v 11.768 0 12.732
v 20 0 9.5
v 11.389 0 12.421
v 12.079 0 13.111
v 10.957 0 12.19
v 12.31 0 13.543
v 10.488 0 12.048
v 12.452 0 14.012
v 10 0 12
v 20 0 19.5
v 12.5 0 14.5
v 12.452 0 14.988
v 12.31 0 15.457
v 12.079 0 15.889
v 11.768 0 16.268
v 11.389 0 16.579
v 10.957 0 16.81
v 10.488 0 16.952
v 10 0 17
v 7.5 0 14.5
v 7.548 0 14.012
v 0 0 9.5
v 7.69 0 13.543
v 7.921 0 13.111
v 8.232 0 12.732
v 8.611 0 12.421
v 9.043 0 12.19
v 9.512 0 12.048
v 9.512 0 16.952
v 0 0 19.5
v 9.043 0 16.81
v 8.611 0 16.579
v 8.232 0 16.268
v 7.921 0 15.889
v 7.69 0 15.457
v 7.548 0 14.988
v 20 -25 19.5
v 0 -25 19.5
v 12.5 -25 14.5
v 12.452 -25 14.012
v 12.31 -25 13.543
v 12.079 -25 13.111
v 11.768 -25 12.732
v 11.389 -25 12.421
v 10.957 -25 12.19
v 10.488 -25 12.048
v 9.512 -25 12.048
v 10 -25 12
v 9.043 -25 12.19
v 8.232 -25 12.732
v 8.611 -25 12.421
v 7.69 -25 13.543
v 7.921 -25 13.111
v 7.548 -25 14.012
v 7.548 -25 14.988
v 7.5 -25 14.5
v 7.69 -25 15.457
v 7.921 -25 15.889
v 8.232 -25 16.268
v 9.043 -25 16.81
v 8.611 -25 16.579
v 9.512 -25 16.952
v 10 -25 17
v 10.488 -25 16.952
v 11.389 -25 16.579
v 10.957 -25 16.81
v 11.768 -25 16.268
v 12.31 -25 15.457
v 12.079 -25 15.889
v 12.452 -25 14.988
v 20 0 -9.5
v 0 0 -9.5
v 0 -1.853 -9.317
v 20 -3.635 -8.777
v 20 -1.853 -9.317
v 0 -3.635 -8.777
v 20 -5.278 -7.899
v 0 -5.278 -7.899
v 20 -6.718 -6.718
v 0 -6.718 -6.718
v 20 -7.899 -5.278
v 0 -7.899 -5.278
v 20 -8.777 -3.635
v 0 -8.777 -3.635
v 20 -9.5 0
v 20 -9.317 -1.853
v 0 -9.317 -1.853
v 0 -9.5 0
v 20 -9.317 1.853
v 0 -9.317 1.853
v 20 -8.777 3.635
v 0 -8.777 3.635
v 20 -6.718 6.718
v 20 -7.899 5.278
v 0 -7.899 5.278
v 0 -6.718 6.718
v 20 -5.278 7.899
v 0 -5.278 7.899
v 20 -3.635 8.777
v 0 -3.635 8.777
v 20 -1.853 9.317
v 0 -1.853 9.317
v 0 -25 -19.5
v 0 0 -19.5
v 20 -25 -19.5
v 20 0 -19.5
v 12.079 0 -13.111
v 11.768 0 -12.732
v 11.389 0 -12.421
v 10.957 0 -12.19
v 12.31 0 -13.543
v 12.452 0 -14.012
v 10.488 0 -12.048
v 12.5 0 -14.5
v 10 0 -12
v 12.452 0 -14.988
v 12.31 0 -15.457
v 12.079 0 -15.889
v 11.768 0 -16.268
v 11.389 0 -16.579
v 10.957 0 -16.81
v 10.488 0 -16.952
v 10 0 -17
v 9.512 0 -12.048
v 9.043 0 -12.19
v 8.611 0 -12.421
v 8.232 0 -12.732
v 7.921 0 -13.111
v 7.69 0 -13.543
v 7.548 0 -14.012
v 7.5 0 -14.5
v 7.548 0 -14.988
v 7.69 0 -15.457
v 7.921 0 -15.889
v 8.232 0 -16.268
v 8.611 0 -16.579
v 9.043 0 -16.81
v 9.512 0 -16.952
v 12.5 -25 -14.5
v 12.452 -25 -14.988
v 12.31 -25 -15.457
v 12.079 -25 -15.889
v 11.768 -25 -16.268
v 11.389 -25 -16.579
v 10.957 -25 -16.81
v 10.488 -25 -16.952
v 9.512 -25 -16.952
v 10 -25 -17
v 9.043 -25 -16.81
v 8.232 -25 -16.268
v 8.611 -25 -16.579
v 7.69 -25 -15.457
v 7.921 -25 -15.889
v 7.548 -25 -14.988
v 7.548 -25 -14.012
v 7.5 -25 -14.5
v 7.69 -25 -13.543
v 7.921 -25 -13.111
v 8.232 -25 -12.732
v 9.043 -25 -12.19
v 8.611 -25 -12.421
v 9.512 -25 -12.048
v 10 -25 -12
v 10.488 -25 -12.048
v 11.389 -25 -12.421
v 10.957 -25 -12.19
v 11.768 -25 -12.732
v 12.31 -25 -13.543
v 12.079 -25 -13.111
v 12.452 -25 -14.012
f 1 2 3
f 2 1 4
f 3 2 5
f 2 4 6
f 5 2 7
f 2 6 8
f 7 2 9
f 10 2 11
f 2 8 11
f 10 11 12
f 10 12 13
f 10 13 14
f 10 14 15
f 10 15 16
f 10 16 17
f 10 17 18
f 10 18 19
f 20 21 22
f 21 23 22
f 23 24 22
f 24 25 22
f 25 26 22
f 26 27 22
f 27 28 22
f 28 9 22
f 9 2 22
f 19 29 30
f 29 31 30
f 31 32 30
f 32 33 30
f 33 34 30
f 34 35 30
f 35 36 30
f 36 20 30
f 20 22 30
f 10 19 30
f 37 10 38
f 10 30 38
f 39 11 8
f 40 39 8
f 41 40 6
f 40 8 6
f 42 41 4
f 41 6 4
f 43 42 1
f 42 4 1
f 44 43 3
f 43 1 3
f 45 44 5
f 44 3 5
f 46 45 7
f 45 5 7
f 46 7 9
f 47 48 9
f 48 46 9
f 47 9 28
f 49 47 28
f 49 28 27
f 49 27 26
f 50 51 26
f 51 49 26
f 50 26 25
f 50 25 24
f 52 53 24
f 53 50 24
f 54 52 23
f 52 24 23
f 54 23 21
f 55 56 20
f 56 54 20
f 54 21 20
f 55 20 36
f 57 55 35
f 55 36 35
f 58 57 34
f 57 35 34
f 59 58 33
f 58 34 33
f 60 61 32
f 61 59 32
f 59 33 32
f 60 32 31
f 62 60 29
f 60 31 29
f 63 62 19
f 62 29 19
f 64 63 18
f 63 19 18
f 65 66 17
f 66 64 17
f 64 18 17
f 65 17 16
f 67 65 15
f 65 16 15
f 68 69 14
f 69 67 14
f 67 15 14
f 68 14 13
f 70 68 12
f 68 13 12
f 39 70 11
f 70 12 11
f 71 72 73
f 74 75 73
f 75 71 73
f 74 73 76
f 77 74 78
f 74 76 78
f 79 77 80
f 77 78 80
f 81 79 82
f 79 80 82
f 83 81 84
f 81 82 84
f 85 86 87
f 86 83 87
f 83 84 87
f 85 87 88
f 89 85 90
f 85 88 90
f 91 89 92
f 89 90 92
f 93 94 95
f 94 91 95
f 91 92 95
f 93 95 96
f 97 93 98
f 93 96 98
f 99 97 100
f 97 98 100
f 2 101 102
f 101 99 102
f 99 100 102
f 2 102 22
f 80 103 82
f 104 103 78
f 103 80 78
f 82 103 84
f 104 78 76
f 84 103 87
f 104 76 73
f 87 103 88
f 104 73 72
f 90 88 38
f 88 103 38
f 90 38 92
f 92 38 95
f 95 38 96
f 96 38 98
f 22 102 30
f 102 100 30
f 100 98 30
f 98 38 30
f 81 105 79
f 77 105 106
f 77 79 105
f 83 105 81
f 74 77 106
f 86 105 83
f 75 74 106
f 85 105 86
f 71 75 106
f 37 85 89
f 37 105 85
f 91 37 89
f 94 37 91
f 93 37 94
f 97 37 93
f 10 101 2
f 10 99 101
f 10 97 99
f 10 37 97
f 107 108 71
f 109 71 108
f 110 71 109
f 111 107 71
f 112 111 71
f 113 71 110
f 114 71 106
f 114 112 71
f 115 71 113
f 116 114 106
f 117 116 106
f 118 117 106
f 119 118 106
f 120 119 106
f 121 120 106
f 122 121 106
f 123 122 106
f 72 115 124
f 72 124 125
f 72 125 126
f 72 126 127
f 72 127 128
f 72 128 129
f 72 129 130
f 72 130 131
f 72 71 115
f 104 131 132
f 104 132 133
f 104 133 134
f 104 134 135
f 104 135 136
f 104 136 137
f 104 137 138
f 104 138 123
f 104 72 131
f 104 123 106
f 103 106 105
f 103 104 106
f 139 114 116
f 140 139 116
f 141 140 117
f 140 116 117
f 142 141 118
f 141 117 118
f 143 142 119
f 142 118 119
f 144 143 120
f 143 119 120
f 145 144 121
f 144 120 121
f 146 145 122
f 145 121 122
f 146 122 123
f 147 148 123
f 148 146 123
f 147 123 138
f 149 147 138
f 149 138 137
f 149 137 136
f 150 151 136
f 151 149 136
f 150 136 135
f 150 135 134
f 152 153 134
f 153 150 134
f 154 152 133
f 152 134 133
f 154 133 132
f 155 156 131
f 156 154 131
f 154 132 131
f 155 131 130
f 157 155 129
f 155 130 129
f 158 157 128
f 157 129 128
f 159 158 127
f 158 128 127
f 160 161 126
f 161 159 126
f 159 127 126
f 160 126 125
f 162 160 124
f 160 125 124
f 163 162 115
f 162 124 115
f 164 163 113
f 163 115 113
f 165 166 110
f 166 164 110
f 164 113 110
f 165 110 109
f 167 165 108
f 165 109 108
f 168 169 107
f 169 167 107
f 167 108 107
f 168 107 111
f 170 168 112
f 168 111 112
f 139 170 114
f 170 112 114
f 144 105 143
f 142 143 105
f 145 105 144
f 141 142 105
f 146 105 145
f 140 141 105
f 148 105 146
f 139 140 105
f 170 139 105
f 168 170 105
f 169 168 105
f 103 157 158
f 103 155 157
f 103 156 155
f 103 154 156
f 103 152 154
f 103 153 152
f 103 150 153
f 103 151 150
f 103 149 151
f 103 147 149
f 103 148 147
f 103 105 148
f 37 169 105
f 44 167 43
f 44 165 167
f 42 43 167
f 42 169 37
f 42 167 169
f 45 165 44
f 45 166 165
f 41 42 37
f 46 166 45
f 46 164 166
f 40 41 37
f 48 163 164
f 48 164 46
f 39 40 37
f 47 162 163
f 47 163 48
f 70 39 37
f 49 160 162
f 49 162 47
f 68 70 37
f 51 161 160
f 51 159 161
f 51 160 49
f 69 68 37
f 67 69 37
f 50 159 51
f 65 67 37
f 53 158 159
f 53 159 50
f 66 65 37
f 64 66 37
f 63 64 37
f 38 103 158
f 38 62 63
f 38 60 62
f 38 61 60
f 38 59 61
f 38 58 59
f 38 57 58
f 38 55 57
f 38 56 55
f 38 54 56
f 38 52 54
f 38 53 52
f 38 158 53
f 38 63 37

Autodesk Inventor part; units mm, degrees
ref_plane "YZ Plane" through (0, 0, 0) normal (1, 0, 0) x (0, 1, 0)
ref_plane "XZ Plane" through (0, 0, 0) normal (0, 1, 0) x (-1, 0, 0)
ref_plane "XY Plane" through (0, 0, 0) normal (0, 0, 1) x (1, 0, 0)
sketch "Sketch1" plane through (0, 0, 0) normal (1, 0, 0) x (0, 1, 0)
  circle A0 centre (0, 0) radius 9.5
  line L0 (0, 9.5) -> (0, 19.5)
  line L1 (0, 19.5) -> (-25, 19.5)
  line L2 (0, -9.5) -> (0, -19.5)
  line L3 (0, -19.5) -> (-25, -19.5)
  line L4 (-25, -19.5) -> (-25, 19.5)
  dimension "d0" = 19
  dimension "d1" = 10
  dimension "d2" = 25
  dimension "d3" = 10
extrude "Extrusion1" add sketch "Sketch1" along normal blind 20 contours A0 L2 L3 L4 L1 L0
sketch "Sketch2" plane through (0, 0, 19.5) normal (0, 1, 0) x (1, 0, 0)
  line L0 (0, 0) -> (0, 5)
  line L1 (0, 0) -> (0, 39) projected
  line L2 (0, 5) -> (10, 5)
  line L3 (20, 0) -> (20, 39) projected
  circle A0 centre (10, 5) radius 2.5
  point P0 (0, 19.5)
  dimension "d6" = 5
  dimension "d7" = 10
  dimension "d8" = 5
extrude "Extrusion2" cut sketch "Sketch2" against normal through all
thread "Thread1" size "M5x0.8" class "6H" standard "ISO Metric profile" full length
mirror "Mirror2" about plane through (0, 0, 0) normal (0, 0, 1) of "Extrusion2"
properties part number "Clamp" material "Steel, Mild"
